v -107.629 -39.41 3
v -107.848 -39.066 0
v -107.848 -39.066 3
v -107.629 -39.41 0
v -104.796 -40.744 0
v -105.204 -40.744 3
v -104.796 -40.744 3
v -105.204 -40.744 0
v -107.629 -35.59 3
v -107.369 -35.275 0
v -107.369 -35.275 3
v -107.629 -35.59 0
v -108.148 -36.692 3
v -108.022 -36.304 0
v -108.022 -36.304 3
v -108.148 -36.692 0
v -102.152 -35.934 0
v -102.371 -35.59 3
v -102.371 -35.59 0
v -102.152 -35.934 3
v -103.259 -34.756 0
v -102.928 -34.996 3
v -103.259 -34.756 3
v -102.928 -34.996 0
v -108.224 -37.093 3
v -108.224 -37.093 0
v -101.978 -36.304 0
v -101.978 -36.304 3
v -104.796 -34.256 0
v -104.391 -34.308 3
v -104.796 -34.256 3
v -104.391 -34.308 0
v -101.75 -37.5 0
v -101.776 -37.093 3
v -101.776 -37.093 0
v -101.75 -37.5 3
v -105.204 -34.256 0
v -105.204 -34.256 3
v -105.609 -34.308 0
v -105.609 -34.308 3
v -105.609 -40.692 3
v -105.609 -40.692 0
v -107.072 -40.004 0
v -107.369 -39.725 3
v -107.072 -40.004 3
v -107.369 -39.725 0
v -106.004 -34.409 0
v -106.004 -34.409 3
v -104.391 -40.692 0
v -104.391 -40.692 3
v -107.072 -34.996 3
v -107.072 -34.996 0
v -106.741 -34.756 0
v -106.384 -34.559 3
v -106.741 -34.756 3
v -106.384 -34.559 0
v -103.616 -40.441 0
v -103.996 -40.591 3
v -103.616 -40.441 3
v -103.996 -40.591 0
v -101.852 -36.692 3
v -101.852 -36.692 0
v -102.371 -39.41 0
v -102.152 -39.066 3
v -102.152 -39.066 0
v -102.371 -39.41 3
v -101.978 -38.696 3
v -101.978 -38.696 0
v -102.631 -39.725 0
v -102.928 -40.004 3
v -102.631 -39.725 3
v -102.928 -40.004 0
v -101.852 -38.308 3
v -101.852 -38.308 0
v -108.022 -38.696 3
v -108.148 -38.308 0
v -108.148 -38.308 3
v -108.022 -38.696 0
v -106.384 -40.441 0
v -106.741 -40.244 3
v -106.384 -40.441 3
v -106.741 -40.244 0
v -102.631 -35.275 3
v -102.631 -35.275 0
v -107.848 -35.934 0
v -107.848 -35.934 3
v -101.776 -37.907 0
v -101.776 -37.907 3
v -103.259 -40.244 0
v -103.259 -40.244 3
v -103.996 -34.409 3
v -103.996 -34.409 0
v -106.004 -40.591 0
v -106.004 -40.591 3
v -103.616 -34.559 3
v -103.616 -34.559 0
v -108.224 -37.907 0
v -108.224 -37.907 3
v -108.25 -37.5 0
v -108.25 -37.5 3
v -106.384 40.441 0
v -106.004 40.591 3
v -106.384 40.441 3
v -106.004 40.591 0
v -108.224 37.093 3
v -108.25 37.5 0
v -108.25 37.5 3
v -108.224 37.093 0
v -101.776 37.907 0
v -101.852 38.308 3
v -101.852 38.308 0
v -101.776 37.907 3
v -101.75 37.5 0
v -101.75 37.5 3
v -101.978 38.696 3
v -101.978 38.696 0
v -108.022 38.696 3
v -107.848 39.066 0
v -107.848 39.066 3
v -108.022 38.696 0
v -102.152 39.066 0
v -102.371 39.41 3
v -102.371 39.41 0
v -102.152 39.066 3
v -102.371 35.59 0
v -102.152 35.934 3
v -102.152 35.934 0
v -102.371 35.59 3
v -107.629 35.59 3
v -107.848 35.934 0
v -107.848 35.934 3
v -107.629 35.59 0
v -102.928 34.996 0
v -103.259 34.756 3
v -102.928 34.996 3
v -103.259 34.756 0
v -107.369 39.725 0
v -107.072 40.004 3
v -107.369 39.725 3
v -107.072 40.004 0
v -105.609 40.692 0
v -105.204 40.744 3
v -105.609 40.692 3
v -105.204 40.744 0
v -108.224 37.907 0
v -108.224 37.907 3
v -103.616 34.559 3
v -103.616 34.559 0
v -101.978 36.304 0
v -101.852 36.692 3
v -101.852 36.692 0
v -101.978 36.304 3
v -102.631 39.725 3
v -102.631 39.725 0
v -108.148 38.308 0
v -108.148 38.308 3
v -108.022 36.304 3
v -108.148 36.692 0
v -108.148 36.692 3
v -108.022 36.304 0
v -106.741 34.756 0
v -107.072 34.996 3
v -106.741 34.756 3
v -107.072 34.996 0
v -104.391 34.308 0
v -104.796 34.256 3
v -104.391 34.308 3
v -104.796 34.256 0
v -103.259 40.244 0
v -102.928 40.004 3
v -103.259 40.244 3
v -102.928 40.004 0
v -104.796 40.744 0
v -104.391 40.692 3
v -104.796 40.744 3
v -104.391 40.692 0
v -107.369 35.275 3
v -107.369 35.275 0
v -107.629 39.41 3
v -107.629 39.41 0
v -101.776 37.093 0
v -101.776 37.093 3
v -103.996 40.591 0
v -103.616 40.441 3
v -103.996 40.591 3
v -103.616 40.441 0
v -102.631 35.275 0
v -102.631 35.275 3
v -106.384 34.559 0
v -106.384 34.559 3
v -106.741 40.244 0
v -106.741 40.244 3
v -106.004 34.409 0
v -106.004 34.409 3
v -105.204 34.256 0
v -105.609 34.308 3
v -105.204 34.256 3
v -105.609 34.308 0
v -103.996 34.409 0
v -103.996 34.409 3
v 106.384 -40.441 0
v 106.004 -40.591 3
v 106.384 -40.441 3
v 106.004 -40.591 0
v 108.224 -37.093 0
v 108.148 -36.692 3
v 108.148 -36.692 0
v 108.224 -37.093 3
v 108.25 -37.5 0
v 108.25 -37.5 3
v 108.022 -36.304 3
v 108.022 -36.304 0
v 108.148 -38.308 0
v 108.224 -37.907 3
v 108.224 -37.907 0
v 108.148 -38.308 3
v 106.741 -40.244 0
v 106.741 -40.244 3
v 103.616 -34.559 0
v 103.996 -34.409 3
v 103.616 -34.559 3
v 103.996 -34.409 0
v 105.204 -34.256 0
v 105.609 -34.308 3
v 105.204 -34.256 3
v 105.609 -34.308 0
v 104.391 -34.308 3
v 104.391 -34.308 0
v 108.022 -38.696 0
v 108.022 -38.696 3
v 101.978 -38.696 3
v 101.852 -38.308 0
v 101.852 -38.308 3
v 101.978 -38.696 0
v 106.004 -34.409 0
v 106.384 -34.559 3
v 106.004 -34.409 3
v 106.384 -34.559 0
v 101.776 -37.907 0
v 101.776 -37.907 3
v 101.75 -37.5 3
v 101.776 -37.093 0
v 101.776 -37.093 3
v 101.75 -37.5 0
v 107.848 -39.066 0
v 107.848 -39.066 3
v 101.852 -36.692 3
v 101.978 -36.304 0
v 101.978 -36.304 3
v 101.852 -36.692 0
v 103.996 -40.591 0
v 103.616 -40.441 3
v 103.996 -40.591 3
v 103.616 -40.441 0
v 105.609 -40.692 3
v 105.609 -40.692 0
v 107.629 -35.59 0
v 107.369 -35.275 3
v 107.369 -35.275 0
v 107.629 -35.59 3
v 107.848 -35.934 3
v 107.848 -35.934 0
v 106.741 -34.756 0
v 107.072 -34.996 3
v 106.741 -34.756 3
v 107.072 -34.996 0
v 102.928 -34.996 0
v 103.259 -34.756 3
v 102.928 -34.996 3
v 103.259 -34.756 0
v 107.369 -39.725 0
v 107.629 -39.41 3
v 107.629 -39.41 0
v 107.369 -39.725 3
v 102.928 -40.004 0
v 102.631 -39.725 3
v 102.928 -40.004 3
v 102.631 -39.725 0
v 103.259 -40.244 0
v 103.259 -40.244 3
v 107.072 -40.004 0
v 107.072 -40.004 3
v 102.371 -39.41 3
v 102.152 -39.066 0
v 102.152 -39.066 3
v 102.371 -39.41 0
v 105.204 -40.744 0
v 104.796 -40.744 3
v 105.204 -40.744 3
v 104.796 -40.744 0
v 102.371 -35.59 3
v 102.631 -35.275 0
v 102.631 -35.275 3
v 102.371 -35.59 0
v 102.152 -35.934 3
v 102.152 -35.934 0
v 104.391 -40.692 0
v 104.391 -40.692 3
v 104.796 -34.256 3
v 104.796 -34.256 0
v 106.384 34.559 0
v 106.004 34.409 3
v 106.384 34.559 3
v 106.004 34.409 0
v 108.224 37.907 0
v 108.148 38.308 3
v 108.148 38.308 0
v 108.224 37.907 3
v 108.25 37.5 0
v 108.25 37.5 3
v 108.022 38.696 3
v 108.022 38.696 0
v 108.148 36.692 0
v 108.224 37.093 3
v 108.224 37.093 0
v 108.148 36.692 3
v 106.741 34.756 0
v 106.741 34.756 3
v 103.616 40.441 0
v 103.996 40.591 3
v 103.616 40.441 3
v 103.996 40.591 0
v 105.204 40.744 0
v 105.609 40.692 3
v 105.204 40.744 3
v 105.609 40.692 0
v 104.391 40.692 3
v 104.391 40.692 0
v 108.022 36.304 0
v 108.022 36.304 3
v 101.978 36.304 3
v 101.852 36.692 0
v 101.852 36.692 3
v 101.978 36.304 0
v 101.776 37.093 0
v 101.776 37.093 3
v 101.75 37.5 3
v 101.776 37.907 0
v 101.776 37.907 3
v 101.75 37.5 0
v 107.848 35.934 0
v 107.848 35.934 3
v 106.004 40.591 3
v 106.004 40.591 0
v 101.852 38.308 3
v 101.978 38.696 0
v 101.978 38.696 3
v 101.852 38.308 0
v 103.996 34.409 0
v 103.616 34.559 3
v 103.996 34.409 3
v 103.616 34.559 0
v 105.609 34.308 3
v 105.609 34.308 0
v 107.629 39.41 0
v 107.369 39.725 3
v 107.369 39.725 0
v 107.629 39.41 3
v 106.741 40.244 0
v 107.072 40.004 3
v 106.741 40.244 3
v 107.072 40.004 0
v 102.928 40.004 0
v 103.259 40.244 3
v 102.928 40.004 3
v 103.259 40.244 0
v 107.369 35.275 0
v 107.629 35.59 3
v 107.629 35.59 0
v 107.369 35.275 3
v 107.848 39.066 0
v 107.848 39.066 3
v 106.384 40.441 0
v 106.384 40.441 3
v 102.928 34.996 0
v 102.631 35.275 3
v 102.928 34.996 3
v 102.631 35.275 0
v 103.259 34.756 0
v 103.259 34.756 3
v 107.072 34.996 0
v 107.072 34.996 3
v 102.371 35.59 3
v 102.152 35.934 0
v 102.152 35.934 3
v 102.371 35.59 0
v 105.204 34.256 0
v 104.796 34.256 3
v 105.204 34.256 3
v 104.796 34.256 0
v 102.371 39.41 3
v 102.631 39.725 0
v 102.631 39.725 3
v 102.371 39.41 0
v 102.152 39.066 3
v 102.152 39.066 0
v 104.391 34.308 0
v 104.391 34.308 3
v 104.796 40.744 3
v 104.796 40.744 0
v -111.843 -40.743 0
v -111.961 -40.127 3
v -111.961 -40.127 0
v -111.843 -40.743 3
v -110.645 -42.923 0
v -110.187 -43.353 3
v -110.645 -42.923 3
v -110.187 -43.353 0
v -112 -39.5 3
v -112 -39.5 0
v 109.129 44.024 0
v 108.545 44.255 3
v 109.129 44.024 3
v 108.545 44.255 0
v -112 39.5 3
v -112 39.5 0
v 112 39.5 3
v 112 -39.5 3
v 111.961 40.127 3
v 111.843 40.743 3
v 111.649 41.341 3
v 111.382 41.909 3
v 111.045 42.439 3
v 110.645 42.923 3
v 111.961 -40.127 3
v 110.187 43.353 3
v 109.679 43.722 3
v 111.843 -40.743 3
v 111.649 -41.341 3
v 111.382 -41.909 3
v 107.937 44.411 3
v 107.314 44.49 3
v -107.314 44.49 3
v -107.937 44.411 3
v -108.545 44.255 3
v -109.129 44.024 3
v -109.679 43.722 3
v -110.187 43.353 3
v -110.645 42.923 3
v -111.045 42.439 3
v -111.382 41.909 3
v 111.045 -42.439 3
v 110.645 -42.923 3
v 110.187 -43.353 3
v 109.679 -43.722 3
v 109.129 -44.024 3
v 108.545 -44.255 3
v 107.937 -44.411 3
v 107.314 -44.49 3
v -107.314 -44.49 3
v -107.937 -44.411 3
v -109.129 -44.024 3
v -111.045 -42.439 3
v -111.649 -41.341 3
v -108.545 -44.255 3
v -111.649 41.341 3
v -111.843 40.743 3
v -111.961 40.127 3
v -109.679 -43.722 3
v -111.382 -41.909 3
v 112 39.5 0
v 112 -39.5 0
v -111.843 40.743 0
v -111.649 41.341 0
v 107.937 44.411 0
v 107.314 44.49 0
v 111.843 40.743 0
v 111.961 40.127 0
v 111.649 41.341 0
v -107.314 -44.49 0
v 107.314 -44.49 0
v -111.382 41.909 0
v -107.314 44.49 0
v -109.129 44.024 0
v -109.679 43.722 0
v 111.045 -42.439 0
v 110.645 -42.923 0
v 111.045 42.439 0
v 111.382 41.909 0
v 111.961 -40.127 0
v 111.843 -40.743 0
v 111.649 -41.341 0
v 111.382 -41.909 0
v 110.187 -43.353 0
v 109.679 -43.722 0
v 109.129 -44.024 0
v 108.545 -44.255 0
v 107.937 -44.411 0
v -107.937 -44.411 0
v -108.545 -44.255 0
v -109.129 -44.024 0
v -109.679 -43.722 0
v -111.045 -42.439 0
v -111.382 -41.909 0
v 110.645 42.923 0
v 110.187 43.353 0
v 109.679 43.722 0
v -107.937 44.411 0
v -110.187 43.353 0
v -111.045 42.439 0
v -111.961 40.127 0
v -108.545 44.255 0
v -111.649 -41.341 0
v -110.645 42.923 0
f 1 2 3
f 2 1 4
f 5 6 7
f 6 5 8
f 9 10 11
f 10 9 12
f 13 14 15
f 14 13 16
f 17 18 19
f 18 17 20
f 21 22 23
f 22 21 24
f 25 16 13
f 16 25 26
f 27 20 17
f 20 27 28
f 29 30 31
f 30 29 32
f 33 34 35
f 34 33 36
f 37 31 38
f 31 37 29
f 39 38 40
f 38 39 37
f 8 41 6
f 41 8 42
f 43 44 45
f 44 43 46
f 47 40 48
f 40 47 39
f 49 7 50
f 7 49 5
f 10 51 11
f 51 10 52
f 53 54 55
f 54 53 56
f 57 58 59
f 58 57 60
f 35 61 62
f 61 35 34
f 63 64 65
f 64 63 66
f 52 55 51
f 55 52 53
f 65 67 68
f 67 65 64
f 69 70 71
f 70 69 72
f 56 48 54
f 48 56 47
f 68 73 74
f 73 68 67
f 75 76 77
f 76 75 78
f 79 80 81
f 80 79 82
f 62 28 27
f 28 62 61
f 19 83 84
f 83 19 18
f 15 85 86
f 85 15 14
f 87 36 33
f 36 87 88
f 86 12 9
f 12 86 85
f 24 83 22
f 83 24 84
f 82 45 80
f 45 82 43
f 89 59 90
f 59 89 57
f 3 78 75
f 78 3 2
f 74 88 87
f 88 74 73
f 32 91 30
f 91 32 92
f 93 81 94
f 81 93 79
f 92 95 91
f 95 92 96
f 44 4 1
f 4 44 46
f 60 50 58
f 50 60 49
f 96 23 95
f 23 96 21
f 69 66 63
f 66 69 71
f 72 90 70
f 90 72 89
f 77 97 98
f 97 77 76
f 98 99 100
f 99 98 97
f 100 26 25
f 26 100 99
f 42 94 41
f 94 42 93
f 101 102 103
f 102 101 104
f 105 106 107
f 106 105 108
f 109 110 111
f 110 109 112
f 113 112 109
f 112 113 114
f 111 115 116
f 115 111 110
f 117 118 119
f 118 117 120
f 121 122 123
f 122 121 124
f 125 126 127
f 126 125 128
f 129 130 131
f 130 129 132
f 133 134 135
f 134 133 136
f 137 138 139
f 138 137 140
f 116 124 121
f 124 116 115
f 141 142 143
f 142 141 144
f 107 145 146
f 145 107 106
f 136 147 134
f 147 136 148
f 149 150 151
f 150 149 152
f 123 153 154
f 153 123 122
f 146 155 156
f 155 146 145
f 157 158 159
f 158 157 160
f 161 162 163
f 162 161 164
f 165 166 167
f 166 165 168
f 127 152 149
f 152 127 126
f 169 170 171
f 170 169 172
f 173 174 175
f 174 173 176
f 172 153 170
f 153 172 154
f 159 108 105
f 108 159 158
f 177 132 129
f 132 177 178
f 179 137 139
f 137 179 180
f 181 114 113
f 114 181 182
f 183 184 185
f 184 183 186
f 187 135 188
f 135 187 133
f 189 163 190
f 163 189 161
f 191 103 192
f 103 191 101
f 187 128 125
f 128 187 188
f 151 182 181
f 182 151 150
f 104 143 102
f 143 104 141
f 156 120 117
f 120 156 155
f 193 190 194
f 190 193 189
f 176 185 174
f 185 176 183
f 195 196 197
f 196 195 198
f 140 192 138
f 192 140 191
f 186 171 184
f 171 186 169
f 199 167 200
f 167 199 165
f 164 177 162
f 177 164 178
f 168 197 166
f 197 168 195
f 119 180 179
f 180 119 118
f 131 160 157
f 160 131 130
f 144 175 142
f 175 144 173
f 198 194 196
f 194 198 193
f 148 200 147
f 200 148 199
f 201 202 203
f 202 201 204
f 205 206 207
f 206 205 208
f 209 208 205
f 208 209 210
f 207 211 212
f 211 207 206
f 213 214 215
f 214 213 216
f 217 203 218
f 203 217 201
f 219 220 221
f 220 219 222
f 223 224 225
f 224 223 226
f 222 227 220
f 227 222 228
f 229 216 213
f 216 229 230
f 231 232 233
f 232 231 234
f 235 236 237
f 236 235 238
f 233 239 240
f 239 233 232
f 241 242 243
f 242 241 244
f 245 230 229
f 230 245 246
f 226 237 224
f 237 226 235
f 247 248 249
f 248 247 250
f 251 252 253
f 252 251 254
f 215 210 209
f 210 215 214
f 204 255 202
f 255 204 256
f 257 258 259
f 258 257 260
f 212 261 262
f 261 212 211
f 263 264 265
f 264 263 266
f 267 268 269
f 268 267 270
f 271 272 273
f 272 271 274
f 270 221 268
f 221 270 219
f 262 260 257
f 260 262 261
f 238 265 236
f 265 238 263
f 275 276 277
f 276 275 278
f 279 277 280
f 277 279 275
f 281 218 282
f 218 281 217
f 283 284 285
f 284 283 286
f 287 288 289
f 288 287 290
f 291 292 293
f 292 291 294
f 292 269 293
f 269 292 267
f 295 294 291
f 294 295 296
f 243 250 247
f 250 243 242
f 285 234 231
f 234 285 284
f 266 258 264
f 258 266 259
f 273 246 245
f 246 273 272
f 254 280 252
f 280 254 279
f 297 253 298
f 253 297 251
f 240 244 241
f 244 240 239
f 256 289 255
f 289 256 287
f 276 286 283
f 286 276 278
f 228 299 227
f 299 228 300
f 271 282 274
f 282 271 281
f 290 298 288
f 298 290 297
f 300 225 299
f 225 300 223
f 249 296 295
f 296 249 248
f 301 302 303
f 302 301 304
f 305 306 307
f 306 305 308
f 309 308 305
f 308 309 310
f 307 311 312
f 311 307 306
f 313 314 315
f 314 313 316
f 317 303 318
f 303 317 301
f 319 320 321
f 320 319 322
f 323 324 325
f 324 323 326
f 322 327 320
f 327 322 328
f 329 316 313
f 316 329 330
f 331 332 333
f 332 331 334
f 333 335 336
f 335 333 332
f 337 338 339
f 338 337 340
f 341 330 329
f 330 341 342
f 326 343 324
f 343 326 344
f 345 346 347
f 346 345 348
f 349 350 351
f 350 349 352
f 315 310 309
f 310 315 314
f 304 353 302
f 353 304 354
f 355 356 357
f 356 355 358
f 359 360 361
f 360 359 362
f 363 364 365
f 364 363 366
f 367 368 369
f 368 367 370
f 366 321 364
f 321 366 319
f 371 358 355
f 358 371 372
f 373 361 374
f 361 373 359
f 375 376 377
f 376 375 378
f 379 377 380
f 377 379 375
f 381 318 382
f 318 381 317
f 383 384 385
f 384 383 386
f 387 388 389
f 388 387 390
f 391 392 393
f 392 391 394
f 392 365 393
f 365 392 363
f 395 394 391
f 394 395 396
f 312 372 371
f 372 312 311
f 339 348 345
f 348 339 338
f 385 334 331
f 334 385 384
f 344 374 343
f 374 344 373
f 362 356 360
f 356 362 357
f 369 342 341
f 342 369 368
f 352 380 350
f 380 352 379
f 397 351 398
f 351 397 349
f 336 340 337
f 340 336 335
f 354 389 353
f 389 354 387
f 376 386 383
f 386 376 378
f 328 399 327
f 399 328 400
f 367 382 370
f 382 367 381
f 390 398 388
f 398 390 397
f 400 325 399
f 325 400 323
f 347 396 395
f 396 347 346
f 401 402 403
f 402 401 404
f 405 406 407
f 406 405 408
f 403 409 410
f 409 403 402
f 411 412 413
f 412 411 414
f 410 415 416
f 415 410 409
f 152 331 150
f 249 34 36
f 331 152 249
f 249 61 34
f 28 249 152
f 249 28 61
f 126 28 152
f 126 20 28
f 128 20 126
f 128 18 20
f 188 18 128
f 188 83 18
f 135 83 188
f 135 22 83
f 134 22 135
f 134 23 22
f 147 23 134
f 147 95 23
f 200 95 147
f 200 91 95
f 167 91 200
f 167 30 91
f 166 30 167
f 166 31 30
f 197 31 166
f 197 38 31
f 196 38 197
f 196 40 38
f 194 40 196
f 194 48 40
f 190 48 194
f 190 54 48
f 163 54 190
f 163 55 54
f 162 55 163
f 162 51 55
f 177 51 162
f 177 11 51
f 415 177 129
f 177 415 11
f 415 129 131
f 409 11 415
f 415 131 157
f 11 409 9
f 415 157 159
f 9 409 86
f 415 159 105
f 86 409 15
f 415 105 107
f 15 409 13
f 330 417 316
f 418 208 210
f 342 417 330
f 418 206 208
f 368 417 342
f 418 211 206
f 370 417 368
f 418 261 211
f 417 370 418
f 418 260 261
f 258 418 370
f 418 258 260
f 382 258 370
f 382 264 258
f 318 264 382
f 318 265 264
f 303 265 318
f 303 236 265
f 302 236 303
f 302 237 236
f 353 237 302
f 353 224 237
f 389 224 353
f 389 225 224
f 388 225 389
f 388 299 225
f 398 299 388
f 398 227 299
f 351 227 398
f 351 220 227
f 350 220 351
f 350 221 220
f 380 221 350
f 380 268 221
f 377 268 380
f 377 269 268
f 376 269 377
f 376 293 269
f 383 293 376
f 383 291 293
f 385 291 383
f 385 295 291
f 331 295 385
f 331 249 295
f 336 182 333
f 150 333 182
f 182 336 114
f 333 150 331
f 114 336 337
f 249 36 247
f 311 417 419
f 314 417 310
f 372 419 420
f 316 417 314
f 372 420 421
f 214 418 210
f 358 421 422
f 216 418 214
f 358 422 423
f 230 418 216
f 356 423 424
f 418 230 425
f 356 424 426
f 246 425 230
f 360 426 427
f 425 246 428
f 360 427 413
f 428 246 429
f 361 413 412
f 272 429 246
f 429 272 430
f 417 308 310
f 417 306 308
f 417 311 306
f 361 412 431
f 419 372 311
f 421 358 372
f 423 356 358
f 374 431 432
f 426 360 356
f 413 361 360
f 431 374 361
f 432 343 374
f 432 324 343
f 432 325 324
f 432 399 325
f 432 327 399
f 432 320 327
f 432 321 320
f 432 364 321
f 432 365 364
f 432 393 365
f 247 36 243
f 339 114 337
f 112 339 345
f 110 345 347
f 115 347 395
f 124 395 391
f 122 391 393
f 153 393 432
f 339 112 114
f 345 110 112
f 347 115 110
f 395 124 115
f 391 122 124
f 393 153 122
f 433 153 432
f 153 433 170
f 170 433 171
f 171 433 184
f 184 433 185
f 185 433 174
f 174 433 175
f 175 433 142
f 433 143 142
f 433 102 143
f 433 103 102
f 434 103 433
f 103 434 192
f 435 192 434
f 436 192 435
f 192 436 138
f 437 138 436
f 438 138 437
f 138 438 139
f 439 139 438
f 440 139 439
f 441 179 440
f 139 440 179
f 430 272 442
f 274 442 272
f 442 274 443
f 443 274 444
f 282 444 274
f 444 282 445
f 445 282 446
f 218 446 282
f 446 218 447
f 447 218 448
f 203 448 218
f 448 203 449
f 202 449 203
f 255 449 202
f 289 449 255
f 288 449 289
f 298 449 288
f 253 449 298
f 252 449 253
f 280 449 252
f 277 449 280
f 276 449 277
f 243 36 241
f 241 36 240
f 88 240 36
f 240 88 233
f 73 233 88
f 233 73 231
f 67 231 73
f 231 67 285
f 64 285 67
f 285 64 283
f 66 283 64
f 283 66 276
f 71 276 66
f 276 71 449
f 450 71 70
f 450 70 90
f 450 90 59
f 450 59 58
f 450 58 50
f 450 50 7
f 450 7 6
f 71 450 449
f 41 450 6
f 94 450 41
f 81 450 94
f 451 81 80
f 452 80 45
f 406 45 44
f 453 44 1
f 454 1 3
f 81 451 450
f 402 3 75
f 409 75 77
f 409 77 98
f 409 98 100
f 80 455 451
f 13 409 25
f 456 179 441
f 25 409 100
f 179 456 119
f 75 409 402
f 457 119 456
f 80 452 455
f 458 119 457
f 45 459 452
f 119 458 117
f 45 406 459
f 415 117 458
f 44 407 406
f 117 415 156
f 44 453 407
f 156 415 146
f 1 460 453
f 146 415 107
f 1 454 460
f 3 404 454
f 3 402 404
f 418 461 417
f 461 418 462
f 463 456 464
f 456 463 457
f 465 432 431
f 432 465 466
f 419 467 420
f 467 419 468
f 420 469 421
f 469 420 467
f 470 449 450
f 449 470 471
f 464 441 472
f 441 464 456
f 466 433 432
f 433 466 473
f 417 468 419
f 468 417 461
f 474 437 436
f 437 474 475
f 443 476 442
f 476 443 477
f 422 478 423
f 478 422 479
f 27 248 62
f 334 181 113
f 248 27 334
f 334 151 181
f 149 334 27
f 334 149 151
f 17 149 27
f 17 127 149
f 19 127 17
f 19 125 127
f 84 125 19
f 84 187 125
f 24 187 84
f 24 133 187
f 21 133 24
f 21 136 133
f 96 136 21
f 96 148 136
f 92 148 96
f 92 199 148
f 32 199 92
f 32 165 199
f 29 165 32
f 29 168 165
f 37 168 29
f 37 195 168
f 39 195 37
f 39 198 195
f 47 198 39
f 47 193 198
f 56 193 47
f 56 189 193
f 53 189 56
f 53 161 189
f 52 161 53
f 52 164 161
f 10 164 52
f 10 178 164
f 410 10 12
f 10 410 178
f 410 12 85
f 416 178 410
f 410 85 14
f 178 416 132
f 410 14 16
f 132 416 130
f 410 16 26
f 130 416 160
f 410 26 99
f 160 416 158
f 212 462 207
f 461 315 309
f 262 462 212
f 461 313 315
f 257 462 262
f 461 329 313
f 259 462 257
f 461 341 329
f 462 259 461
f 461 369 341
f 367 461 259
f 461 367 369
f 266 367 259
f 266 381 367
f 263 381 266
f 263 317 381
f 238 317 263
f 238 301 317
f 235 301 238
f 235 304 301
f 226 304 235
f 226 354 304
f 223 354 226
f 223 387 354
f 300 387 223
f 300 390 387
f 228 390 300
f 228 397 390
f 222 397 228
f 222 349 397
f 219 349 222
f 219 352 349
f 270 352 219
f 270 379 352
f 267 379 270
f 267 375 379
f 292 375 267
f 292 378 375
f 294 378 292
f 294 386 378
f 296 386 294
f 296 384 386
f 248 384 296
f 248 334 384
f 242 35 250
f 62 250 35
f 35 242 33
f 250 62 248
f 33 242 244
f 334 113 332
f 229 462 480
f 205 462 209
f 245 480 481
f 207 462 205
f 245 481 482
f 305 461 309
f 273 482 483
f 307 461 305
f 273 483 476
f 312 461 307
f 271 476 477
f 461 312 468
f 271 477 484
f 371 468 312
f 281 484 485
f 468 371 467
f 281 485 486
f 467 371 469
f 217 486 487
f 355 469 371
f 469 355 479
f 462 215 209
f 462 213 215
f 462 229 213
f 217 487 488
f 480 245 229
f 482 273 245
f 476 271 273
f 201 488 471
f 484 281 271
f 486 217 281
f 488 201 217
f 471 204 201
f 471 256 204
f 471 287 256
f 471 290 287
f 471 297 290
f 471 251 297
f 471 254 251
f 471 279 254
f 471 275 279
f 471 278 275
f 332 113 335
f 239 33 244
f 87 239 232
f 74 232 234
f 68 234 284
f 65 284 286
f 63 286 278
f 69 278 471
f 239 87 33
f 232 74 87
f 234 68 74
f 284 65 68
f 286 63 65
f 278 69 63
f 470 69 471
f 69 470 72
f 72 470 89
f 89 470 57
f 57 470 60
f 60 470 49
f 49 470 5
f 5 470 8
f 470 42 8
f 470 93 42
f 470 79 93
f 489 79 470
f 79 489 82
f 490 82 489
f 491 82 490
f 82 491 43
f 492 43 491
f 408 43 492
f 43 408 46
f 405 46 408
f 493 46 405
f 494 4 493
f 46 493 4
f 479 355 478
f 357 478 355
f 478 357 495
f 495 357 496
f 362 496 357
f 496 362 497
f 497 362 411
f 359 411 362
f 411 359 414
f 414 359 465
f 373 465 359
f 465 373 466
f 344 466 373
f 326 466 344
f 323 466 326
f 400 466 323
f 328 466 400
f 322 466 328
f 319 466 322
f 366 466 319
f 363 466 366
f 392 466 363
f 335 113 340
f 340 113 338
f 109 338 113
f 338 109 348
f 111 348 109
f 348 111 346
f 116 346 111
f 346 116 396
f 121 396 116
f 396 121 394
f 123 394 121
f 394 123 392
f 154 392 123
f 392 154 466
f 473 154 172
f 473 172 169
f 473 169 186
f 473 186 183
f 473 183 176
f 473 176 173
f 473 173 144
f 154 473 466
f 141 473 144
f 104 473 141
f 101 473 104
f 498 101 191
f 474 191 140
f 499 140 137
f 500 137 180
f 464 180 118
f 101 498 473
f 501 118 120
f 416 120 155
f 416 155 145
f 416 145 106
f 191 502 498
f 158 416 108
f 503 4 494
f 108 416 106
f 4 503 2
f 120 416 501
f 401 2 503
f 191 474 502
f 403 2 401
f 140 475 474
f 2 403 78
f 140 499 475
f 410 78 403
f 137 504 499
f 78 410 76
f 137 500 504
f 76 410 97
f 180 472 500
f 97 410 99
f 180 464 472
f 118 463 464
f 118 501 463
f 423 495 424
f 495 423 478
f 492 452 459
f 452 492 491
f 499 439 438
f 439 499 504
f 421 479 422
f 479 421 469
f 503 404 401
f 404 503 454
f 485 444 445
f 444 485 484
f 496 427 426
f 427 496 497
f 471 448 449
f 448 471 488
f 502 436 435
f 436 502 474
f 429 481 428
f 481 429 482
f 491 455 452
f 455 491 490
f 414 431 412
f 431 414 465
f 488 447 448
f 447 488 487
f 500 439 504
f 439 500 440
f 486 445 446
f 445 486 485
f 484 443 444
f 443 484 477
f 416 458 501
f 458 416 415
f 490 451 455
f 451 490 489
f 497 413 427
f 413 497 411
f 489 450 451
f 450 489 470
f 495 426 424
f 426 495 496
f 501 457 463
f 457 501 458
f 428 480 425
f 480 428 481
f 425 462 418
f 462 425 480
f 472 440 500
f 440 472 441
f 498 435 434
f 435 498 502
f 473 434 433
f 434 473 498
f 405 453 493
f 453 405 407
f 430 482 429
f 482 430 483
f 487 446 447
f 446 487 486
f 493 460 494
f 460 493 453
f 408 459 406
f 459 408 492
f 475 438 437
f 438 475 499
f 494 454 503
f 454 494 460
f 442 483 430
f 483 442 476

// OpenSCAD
$fn = 50;


difference() {
	union() {
		hull() {
			translate(v = [-107.0000000000, 39.5000000000, 0]) {
				cylinder(h = 3, r = 5);
			}
			translate(v = [107.0000000000, 39.5000000000, 0]) {
				cylinder(h = 3, r = 5);
			}
			translate(v = [-107.0000000000, -39.5000000000, 0]) {
				cylinder(h = 3, r = 5);
			}
			translate(v = [107.0000000000, -39.5000000000, 0]) {
				cylinder(h = 3, r = 5);
			}
		}
	}
	union() {
		translate(v = [-105.0000000000, -37.5000000000, -100.0000000000]) {
			cylinder(h = 200, r = 3.2500000000);
		}
		translate(v = [-105.0000000000, 37.5000000000, -100.0000000000]) {
			cylinder(h = 200, r = 3.2500000000);
		}
		translate(v = [105.0000000000, -37.5000000000, -100.0000000000]) {
			cylinder(h = 200, r = 3.2500000000);
		}
		translate(v = [105.0000000000, 37.5000000000, -100.0000000000]) {
			cylinder(h = 200, r = 3.2500000000);
		}
	}
}
